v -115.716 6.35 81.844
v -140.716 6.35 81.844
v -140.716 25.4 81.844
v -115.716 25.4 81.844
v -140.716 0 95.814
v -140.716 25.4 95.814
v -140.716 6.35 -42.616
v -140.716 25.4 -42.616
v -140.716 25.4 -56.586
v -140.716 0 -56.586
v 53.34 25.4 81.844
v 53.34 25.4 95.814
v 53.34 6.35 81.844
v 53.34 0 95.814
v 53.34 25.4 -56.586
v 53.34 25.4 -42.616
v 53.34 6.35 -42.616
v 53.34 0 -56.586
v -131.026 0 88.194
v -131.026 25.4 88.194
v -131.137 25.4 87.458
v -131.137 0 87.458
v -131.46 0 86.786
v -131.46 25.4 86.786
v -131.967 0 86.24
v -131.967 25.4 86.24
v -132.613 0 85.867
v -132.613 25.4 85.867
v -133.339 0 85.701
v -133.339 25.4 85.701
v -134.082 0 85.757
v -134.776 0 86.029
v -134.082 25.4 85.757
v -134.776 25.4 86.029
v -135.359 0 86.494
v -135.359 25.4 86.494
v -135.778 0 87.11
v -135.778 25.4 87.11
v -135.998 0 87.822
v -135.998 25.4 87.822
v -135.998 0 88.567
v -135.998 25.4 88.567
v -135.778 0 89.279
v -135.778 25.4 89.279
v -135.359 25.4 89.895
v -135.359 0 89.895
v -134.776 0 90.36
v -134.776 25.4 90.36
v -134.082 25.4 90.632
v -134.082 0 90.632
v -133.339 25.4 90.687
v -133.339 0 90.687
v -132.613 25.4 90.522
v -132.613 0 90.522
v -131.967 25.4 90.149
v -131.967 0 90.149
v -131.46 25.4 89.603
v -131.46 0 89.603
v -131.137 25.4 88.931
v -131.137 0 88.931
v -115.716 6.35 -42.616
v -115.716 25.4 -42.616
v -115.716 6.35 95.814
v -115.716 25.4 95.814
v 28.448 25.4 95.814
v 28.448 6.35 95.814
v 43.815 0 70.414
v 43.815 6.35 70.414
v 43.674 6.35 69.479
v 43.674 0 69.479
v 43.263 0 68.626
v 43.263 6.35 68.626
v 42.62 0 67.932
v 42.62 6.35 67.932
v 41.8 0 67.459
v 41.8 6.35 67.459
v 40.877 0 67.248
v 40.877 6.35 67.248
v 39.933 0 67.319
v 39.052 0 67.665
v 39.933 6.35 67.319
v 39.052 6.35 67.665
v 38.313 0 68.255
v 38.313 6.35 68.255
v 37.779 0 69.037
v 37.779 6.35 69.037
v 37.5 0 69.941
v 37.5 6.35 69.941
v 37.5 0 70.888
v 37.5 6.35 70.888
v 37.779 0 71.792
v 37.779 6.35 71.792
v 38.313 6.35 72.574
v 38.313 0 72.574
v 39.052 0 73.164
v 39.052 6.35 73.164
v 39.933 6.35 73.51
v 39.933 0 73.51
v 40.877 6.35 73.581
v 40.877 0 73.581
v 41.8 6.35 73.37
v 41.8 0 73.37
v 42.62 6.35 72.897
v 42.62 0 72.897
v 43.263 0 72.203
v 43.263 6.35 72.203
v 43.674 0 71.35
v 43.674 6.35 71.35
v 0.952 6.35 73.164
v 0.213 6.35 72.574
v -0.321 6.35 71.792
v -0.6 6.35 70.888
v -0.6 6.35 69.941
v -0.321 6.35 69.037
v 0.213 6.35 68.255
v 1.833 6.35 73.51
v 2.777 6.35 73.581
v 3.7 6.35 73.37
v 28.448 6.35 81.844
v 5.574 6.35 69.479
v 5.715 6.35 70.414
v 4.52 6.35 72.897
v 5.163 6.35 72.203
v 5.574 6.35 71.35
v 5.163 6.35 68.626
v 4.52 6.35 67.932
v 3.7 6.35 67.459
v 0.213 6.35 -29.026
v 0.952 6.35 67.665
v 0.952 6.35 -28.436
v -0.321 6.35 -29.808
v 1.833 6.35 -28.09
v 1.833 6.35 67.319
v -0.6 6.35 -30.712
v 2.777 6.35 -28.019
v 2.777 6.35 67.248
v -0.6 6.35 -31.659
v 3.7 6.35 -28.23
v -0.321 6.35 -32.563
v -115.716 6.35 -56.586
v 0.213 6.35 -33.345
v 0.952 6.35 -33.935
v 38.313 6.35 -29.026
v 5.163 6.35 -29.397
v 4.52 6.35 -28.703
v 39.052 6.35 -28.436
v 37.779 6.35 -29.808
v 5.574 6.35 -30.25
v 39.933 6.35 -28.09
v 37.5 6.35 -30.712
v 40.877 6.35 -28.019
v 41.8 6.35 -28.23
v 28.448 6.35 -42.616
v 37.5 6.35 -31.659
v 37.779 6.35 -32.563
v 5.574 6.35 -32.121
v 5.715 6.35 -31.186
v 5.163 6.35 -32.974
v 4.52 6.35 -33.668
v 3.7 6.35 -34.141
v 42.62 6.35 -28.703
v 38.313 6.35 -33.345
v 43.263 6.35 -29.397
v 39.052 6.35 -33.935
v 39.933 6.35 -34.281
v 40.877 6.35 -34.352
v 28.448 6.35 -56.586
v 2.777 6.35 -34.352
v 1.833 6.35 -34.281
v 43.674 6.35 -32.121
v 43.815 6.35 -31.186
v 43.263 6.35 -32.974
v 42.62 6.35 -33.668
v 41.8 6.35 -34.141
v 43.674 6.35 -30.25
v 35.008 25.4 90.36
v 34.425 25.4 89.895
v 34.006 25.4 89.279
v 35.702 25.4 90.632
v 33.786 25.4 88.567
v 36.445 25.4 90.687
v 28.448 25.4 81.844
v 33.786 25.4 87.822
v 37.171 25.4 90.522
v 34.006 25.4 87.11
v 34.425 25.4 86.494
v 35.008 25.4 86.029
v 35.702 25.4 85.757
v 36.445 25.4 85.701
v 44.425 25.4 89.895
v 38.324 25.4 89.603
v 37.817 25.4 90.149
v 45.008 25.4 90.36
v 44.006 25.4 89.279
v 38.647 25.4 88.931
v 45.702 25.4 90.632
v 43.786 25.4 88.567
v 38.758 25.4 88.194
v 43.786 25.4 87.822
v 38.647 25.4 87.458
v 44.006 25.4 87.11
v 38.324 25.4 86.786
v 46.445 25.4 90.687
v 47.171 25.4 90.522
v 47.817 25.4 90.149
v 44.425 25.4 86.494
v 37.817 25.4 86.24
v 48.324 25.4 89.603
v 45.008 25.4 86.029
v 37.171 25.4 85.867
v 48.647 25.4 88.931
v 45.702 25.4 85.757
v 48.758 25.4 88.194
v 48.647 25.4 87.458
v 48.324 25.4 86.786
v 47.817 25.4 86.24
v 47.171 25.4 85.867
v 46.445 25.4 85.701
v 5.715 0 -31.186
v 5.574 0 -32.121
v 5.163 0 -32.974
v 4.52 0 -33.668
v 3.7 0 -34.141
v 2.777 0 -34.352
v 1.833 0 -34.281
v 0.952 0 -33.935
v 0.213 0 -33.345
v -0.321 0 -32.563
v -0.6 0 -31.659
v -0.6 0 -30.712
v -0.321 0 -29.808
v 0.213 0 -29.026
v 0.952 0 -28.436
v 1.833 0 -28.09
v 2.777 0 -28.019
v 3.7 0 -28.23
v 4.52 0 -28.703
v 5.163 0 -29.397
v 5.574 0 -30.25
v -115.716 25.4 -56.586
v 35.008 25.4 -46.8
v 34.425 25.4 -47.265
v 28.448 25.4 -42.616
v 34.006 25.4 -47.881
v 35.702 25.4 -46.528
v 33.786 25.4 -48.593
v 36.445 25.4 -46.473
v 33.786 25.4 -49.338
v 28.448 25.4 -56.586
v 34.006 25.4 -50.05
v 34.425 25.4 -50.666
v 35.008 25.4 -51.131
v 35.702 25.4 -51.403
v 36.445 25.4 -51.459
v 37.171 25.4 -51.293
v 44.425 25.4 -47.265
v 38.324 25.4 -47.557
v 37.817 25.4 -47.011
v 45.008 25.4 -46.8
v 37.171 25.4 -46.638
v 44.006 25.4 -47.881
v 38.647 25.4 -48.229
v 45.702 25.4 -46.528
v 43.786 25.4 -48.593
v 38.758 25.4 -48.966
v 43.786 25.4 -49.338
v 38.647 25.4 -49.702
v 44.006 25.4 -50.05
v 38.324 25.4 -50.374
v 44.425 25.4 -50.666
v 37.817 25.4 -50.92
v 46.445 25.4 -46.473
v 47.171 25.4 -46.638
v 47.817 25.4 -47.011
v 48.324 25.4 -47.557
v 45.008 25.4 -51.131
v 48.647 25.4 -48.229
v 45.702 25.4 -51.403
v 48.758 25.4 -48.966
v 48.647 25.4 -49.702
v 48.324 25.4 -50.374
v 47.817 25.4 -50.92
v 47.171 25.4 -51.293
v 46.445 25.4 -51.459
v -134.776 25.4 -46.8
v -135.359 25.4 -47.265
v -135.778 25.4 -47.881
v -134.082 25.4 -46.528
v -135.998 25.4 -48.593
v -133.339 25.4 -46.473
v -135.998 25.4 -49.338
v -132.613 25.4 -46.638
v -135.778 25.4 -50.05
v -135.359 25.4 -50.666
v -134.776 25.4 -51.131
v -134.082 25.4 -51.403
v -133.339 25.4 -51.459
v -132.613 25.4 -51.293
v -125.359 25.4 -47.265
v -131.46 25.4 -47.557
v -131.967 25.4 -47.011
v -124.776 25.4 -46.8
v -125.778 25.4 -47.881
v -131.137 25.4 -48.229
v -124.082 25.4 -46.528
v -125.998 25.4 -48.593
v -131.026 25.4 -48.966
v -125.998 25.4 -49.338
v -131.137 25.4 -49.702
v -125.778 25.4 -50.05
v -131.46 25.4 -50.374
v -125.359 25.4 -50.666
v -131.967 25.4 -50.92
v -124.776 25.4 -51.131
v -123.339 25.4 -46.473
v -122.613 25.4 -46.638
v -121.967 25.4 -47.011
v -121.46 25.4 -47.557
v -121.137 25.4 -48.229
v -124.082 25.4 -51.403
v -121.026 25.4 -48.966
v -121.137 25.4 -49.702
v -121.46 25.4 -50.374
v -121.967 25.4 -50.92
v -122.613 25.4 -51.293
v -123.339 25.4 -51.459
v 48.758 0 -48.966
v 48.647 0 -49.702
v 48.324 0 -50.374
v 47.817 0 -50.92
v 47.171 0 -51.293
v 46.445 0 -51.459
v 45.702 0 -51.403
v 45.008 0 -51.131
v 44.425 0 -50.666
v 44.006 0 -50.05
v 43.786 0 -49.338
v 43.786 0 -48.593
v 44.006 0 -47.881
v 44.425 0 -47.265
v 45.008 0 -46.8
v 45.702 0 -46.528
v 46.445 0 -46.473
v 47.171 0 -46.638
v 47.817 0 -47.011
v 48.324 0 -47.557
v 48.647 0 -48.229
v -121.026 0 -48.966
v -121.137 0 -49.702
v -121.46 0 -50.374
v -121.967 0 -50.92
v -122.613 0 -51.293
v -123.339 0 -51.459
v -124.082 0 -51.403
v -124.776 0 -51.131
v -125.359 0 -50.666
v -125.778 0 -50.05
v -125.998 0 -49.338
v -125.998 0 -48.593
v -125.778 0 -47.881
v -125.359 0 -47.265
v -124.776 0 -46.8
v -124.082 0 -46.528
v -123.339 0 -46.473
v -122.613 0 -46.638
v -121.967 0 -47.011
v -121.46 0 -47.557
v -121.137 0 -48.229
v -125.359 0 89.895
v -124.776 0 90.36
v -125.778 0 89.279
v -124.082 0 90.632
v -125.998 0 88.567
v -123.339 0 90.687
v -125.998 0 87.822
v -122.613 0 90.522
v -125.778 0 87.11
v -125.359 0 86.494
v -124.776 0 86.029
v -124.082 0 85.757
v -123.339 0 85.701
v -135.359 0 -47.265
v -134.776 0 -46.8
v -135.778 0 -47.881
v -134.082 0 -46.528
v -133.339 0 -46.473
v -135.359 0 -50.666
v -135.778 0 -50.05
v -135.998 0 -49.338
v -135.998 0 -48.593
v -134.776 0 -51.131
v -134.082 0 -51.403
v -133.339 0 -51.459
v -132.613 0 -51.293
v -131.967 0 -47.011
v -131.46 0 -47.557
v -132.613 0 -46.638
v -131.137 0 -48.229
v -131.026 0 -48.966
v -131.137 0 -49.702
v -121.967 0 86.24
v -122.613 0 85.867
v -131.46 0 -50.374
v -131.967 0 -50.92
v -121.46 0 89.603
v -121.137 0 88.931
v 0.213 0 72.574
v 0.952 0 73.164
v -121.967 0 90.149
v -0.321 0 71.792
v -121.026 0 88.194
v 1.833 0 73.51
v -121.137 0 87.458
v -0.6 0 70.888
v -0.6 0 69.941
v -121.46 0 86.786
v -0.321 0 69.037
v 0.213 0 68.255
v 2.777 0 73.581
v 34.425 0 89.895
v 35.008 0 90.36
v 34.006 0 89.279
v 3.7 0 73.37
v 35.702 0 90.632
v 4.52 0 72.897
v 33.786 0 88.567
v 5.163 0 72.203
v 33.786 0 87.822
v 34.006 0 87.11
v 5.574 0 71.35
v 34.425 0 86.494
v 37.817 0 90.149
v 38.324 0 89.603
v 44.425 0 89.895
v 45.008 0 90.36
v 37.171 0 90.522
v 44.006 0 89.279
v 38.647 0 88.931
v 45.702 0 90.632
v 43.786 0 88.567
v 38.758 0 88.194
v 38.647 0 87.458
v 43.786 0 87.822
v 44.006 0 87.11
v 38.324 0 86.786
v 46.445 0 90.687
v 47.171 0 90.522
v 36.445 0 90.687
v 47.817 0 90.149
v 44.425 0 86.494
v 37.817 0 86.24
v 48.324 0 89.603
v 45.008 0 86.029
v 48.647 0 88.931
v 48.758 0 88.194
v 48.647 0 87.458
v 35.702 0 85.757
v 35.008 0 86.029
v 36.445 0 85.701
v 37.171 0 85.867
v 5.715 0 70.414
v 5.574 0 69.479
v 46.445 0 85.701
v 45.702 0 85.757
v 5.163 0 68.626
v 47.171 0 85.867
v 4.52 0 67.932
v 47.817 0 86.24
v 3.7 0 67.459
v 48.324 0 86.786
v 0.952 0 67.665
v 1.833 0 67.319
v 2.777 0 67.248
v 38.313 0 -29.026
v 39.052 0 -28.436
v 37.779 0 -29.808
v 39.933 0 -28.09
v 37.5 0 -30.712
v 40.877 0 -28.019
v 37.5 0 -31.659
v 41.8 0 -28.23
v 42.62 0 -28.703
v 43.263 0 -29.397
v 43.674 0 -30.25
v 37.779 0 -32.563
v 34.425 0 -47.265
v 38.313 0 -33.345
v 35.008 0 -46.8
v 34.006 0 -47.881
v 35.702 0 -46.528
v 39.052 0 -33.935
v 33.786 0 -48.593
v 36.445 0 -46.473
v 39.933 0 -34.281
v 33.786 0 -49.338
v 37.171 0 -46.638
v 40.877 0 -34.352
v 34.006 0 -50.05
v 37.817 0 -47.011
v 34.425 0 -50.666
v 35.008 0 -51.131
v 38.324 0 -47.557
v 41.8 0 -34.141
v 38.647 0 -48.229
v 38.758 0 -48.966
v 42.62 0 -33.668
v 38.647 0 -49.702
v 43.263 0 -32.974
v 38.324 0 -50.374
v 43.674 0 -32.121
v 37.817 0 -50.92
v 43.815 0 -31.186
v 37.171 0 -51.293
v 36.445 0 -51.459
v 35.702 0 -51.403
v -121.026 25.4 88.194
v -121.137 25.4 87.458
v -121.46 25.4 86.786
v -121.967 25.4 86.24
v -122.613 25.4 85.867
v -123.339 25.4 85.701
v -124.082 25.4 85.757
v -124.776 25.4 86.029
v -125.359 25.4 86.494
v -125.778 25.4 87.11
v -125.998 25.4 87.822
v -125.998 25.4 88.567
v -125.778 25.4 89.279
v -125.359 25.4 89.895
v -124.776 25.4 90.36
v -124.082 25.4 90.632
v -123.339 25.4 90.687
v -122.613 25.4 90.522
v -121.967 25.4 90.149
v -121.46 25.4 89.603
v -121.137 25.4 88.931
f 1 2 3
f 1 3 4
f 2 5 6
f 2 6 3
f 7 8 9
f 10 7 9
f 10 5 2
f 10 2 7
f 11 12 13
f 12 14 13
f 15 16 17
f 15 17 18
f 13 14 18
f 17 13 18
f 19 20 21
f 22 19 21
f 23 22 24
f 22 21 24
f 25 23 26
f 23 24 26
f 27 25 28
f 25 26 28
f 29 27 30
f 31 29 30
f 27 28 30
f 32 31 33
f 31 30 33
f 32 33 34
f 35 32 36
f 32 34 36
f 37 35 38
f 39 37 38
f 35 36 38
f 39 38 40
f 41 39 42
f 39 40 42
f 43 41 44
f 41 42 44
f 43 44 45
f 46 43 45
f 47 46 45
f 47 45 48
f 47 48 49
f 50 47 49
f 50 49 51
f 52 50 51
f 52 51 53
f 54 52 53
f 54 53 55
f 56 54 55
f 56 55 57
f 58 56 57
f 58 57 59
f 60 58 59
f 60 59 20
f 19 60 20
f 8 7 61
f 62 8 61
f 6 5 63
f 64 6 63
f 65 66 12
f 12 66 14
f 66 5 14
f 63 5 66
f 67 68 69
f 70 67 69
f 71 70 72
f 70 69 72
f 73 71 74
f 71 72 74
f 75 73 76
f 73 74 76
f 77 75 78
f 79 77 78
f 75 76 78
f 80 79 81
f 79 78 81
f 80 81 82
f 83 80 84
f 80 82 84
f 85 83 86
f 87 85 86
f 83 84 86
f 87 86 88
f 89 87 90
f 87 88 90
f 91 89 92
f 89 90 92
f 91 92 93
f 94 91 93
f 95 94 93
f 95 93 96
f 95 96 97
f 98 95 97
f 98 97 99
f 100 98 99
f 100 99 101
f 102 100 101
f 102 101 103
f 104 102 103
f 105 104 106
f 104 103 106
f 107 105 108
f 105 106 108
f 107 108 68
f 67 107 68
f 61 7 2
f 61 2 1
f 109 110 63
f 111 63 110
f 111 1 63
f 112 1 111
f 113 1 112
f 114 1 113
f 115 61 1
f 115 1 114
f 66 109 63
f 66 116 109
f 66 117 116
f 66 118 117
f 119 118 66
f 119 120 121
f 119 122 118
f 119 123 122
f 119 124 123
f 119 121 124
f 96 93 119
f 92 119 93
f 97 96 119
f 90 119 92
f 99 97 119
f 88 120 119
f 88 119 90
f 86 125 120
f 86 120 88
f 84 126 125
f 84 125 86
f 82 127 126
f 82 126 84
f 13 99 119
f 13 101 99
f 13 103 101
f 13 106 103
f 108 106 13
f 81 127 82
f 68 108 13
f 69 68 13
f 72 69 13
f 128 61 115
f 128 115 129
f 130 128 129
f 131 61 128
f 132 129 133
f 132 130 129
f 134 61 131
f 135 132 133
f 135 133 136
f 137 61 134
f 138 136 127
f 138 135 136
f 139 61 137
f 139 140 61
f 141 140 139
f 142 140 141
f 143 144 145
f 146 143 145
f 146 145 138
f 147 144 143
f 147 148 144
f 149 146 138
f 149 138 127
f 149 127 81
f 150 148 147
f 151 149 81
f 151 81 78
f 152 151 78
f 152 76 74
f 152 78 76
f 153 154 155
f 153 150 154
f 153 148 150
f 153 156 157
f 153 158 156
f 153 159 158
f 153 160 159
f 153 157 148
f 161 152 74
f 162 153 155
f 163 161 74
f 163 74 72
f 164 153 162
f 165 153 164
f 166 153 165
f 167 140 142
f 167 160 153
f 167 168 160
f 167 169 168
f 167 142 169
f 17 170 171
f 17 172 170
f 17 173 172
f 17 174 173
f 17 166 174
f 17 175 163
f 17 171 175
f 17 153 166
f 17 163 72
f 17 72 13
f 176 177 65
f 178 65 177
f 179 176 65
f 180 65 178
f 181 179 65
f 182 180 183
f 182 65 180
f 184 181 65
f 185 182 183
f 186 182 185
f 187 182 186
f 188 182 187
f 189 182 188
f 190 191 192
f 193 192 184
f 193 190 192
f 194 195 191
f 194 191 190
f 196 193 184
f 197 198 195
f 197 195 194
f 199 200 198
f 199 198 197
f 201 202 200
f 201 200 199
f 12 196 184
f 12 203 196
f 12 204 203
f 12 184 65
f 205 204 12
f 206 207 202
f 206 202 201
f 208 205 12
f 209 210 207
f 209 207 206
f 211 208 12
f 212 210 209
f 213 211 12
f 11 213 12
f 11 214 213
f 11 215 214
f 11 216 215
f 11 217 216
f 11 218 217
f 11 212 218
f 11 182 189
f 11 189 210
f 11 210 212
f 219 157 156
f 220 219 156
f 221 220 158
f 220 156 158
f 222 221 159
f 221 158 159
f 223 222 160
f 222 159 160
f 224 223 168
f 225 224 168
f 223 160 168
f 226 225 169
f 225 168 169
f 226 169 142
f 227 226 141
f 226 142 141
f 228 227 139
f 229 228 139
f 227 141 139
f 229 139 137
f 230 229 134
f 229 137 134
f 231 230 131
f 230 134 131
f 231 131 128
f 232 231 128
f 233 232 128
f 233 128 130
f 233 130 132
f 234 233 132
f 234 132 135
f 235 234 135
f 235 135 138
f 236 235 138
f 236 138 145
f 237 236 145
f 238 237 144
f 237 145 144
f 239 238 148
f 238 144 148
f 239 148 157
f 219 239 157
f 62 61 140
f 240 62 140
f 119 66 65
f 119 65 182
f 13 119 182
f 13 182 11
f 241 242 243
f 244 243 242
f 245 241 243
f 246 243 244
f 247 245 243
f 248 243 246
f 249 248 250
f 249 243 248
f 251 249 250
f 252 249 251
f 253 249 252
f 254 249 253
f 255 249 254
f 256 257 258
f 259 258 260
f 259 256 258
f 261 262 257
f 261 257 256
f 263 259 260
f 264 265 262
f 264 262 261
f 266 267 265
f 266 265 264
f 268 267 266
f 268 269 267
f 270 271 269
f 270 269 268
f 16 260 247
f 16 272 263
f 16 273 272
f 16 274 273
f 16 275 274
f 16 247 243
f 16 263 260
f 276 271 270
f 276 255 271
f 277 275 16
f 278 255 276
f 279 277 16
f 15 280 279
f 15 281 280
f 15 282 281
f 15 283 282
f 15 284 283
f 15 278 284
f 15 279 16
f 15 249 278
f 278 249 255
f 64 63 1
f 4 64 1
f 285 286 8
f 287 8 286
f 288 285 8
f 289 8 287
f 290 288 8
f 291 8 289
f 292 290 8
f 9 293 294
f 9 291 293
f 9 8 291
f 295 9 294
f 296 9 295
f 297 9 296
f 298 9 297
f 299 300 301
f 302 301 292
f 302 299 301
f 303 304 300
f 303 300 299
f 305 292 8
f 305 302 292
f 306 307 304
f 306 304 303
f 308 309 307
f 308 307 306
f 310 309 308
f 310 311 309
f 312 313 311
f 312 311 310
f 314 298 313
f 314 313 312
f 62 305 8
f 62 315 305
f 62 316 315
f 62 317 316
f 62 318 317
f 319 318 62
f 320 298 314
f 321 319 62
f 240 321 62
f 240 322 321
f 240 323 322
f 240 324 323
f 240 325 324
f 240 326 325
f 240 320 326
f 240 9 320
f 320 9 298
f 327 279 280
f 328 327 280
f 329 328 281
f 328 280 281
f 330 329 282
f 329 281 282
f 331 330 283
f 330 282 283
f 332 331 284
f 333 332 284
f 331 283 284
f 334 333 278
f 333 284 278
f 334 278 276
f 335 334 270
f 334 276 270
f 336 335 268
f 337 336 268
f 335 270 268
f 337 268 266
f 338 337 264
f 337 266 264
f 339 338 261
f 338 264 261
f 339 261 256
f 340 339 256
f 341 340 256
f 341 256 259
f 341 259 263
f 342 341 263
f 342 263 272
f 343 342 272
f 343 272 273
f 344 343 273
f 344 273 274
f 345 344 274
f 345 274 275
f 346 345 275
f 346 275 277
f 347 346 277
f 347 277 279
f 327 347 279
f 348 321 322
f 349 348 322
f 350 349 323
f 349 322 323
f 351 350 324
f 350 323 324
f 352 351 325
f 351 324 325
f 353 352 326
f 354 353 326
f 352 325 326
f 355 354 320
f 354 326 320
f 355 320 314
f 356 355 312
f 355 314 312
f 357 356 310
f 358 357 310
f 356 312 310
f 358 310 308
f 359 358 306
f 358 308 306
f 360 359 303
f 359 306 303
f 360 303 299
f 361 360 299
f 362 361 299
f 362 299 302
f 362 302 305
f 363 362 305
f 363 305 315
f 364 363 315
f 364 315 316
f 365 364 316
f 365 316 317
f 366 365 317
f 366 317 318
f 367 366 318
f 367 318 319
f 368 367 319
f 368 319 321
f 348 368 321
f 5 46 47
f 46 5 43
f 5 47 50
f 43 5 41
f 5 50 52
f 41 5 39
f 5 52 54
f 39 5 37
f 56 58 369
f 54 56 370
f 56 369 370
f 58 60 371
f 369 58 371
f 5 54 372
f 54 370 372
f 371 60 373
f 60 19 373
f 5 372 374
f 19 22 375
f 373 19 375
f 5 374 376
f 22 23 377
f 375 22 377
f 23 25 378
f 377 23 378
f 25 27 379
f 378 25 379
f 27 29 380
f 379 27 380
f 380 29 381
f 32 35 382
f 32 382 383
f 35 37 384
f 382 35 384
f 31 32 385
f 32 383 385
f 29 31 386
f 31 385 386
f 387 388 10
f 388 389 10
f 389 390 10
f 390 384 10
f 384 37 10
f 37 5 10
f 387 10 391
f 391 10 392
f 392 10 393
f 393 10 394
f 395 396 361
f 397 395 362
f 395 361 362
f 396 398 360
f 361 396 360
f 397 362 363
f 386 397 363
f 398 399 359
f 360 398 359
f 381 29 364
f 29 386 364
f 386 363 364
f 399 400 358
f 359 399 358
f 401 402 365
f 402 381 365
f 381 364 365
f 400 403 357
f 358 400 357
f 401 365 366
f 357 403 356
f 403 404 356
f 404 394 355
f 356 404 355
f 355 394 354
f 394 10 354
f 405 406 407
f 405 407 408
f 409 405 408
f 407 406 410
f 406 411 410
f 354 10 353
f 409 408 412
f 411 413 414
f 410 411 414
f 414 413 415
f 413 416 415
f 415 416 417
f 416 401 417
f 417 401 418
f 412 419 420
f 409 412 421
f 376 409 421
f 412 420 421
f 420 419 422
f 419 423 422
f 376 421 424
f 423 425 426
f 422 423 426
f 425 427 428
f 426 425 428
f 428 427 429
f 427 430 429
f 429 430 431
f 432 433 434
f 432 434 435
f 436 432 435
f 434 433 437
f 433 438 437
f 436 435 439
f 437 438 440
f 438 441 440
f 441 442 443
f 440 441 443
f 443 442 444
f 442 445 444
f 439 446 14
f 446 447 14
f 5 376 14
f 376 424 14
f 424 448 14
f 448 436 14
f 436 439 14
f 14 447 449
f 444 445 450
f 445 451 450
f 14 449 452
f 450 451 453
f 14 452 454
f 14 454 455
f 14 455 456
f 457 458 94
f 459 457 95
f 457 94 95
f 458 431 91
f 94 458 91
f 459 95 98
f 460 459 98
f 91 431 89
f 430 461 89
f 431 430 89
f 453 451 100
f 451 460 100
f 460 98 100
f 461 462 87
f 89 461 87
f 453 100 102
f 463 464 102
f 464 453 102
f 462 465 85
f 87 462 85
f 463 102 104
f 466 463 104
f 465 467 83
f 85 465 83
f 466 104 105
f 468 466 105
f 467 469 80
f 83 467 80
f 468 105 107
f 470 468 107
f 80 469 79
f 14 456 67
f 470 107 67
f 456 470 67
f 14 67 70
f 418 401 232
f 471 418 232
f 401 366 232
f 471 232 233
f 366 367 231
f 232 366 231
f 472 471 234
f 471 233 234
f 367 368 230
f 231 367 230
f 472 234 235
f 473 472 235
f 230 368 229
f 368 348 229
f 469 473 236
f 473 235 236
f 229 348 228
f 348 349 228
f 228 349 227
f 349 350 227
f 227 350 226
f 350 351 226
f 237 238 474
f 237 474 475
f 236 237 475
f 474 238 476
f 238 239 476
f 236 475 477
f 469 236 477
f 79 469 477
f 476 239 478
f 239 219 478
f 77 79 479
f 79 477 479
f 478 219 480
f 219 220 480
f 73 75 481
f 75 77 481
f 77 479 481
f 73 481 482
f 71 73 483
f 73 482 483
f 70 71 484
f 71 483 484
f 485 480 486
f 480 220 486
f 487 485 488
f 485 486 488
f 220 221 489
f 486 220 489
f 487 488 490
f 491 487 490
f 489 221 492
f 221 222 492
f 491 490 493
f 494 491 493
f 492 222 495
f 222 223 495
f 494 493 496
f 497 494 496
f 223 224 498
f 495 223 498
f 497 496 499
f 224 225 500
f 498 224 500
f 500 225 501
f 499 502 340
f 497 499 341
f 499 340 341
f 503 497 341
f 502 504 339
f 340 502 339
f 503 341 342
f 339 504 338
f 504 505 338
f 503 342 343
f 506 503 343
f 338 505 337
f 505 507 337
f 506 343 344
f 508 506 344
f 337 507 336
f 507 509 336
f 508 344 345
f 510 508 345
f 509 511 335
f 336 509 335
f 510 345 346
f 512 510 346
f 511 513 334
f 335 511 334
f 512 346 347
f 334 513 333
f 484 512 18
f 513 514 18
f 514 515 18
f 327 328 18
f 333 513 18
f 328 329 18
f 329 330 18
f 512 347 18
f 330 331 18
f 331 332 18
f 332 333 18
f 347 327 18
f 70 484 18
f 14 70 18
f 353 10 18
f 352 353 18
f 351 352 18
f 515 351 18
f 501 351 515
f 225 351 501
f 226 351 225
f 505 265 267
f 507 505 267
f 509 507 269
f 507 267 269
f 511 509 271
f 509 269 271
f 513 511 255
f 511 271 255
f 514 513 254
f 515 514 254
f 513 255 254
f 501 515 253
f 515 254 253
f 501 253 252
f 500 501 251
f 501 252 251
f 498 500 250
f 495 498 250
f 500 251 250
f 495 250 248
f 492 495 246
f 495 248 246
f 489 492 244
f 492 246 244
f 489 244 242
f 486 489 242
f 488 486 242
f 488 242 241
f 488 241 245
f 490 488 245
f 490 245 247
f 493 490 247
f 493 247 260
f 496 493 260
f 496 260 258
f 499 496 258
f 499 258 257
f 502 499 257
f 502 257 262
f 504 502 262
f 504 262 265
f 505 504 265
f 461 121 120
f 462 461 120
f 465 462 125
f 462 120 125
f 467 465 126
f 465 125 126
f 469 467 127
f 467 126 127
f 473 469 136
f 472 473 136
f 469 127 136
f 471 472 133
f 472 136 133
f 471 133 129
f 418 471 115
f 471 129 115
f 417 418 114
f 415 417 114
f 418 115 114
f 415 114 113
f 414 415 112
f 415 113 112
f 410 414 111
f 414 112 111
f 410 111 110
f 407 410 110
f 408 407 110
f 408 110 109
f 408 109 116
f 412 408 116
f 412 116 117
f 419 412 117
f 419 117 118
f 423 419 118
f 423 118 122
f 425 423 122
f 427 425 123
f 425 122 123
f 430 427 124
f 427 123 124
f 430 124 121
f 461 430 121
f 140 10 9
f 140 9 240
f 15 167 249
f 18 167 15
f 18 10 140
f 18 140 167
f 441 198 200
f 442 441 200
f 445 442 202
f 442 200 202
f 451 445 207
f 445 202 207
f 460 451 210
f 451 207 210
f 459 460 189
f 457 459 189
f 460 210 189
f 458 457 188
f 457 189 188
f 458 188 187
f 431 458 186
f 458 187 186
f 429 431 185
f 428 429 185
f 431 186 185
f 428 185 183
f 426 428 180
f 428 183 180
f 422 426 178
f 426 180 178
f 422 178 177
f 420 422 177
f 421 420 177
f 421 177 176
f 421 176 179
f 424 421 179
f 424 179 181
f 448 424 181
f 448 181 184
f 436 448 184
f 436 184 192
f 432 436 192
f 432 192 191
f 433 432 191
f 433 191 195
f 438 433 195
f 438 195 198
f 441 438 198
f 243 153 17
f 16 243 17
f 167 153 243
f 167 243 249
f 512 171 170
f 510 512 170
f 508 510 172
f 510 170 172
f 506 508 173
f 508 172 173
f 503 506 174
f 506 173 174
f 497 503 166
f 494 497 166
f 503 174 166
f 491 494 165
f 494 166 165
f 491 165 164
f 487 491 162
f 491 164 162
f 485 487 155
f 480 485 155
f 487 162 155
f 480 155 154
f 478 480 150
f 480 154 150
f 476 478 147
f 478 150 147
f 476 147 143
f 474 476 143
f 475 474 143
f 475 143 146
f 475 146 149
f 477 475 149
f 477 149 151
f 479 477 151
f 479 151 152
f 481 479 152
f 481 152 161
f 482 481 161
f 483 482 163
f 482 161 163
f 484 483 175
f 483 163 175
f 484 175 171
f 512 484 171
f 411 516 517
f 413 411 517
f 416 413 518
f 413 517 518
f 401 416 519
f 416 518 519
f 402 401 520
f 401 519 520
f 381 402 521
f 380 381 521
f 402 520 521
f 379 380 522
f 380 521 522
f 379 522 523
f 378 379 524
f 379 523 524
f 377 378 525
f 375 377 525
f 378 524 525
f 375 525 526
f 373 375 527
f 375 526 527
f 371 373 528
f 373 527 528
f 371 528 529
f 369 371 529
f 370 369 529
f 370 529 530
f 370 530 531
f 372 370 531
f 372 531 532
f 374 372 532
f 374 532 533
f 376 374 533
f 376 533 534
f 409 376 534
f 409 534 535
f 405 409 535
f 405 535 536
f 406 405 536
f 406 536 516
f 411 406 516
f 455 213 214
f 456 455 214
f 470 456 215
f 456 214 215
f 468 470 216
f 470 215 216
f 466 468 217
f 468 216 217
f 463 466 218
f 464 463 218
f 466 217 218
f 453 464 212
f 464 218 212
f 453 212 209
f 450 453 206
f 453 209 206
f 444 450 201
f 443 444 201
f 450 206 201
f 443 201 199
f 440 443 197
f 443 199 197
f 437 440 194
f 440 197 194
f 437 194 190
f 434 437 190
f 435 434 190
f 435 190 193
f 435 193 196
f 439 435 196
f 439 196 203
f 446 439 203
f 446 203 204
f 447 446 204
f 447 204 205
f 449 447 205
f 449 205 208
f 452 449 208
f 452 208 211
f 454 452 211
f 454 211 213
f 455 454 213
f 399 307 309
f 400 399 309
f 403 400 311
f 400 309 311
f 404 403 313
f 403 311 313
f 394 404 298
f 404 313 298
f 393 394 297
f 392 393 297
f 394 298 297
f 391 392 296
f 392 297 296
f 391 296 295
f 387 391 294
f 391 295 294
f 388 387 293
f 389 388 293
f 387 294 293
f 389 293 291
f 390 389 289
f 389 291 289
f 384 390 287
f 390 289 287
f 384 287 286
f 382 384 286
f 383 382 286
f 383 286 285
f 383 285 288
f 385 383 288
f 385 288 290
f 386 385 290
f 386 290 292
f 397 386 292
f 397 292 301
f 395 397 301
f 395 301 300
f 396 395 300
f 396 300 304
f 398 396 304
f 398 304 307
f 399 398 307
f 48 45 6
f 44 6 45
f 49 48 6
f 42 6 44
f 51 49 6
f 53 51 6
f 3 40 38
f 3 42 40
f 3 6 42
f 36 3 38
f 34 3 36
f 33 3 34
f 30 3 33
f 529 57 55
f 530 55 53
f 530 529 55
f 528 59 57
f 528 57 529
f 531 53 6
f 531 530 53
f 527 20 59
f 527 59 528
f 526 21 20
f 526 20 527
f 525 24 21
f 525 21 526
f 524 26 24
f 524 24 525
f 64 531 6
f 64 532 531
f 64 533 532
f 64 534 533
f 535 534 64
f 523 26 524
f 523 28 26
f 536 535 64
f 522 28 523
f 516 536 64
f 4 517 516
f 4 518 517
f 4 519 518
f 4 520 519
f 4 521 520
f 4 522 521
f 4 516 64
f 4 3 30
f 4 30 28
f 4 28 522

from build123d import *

# Parameters (mm, degrees)
SKETCH2_W           = 194.056
SKETCH2_H           = 152.4
BOSS_EXTRUDE1_DEPTH = 6.35
SKETCH3_R           = 3.175
CUT_EXTRUDE1_DEPTH  = 6.35
SKETCH4_W           = 24.892
SKETCH4_H           = 13.97
SKETCH4_W_2         = 25
BOSS_EXTRUDE2_DEPTH = 19.05
SKETCH5_R           = 2.5
CUT_EXTRUDE2_DEPTH  = 26.4


with BuildPart() as part:
    # Sketch2 → Boss-Extrude1 (new body)
    with BuildSketch(Plane(origin=(0, 0, 0), x_dir=(1, 0, 0), z_dir=(0, 1, 0))):
        with Locations((-43.688, -19.614444444)):
            Rectangle(SKETCH2_W, SKETCH2_H)
    extrude(amount=BOSS_EXTRUDE1_DEPTH)

    # Sketch3 → Cut-Extrude1 (cut)
    with BuildSketch(Plane(origin=(0, 6.35, 0), x_dir=(1, 0, 0), z_dir=(0, 1, 0))):
        with Locations((2.54, -70.414444444)):
            Circle(SKETCH3_R)
        with Locations((2.54, 31.185555556)):
            Circle(SKETCH3_R)
        with Locations((40.64, 31.185555556)):
            Circle(SKETCH3_R)
        with Locations((40.64, -70.414444444)):
            Circle(SKETCH3_R)
    extrude(amount=-CUT_EXTRUDE1_DEPTH, mode=Mode.SUBTRACT)

    # Sketch4 → Boss-Extrude2 (add)
    with BuildSketch(Plane(origin=(0, 6.35, 0), x_dir=(1, 0, 0), z_dir=(0, 1, 0))):
        with Locations((40.894, -88.829444444)):
            Rectangle(SKETCH4_W, SKETCH4_H)
        with Locations((-128.216, -88.829444444)):
            Rectangle(SKETCH4_W_2, SKETCH4_H)
        with Locations((-128.216, 49.600555556)):
            Rectangle(SKETCH4_W_2, SKETCH4_H)
        with Locations((40.894, 49.600555556)):
            Rectangle(SKETCH4_W, SKETCH4_H)
    extrude(amount=BOSS_EXTRUDE2_DEPTH)

    # Sketch5 → Cut-Extrude2 (cut, through all)
    with BuildSketch(Plane(origin=(0, 25.4, 0), x_dir=(1, 0, 0), z_dir=(0, 1, 0))):
        with Locations((-133.526, -88.194444444)):
            Circle(SKETCH5_R)
        with Locations((-123.526, -88.194444444)):
            Circle(SKETCH5_R)
        with Locations((-133.526, 48.965555556)):
            Circle(SKETCH5_R)
        with Locations((-123.526, 48.965555556)):
            Circle(SKETCH5_R)
        with Locations((36.258, 48.965555556)):
            Circle(SKETCH5_R)
        with Locations((46.258, 48.965555556)):
            Circle(SKETCH5_R)
        with Locations((36.258, -88.194444444)):
            Circle(SKETCH5_R)
        with Locations((46.258, -88.194444444)):
            Circle(SKETCH5_R)
    extrude(amount=-CUT_EXTRUDE2_DEPTH, mode=Mode.SUBTRACT)


solid = part.part
